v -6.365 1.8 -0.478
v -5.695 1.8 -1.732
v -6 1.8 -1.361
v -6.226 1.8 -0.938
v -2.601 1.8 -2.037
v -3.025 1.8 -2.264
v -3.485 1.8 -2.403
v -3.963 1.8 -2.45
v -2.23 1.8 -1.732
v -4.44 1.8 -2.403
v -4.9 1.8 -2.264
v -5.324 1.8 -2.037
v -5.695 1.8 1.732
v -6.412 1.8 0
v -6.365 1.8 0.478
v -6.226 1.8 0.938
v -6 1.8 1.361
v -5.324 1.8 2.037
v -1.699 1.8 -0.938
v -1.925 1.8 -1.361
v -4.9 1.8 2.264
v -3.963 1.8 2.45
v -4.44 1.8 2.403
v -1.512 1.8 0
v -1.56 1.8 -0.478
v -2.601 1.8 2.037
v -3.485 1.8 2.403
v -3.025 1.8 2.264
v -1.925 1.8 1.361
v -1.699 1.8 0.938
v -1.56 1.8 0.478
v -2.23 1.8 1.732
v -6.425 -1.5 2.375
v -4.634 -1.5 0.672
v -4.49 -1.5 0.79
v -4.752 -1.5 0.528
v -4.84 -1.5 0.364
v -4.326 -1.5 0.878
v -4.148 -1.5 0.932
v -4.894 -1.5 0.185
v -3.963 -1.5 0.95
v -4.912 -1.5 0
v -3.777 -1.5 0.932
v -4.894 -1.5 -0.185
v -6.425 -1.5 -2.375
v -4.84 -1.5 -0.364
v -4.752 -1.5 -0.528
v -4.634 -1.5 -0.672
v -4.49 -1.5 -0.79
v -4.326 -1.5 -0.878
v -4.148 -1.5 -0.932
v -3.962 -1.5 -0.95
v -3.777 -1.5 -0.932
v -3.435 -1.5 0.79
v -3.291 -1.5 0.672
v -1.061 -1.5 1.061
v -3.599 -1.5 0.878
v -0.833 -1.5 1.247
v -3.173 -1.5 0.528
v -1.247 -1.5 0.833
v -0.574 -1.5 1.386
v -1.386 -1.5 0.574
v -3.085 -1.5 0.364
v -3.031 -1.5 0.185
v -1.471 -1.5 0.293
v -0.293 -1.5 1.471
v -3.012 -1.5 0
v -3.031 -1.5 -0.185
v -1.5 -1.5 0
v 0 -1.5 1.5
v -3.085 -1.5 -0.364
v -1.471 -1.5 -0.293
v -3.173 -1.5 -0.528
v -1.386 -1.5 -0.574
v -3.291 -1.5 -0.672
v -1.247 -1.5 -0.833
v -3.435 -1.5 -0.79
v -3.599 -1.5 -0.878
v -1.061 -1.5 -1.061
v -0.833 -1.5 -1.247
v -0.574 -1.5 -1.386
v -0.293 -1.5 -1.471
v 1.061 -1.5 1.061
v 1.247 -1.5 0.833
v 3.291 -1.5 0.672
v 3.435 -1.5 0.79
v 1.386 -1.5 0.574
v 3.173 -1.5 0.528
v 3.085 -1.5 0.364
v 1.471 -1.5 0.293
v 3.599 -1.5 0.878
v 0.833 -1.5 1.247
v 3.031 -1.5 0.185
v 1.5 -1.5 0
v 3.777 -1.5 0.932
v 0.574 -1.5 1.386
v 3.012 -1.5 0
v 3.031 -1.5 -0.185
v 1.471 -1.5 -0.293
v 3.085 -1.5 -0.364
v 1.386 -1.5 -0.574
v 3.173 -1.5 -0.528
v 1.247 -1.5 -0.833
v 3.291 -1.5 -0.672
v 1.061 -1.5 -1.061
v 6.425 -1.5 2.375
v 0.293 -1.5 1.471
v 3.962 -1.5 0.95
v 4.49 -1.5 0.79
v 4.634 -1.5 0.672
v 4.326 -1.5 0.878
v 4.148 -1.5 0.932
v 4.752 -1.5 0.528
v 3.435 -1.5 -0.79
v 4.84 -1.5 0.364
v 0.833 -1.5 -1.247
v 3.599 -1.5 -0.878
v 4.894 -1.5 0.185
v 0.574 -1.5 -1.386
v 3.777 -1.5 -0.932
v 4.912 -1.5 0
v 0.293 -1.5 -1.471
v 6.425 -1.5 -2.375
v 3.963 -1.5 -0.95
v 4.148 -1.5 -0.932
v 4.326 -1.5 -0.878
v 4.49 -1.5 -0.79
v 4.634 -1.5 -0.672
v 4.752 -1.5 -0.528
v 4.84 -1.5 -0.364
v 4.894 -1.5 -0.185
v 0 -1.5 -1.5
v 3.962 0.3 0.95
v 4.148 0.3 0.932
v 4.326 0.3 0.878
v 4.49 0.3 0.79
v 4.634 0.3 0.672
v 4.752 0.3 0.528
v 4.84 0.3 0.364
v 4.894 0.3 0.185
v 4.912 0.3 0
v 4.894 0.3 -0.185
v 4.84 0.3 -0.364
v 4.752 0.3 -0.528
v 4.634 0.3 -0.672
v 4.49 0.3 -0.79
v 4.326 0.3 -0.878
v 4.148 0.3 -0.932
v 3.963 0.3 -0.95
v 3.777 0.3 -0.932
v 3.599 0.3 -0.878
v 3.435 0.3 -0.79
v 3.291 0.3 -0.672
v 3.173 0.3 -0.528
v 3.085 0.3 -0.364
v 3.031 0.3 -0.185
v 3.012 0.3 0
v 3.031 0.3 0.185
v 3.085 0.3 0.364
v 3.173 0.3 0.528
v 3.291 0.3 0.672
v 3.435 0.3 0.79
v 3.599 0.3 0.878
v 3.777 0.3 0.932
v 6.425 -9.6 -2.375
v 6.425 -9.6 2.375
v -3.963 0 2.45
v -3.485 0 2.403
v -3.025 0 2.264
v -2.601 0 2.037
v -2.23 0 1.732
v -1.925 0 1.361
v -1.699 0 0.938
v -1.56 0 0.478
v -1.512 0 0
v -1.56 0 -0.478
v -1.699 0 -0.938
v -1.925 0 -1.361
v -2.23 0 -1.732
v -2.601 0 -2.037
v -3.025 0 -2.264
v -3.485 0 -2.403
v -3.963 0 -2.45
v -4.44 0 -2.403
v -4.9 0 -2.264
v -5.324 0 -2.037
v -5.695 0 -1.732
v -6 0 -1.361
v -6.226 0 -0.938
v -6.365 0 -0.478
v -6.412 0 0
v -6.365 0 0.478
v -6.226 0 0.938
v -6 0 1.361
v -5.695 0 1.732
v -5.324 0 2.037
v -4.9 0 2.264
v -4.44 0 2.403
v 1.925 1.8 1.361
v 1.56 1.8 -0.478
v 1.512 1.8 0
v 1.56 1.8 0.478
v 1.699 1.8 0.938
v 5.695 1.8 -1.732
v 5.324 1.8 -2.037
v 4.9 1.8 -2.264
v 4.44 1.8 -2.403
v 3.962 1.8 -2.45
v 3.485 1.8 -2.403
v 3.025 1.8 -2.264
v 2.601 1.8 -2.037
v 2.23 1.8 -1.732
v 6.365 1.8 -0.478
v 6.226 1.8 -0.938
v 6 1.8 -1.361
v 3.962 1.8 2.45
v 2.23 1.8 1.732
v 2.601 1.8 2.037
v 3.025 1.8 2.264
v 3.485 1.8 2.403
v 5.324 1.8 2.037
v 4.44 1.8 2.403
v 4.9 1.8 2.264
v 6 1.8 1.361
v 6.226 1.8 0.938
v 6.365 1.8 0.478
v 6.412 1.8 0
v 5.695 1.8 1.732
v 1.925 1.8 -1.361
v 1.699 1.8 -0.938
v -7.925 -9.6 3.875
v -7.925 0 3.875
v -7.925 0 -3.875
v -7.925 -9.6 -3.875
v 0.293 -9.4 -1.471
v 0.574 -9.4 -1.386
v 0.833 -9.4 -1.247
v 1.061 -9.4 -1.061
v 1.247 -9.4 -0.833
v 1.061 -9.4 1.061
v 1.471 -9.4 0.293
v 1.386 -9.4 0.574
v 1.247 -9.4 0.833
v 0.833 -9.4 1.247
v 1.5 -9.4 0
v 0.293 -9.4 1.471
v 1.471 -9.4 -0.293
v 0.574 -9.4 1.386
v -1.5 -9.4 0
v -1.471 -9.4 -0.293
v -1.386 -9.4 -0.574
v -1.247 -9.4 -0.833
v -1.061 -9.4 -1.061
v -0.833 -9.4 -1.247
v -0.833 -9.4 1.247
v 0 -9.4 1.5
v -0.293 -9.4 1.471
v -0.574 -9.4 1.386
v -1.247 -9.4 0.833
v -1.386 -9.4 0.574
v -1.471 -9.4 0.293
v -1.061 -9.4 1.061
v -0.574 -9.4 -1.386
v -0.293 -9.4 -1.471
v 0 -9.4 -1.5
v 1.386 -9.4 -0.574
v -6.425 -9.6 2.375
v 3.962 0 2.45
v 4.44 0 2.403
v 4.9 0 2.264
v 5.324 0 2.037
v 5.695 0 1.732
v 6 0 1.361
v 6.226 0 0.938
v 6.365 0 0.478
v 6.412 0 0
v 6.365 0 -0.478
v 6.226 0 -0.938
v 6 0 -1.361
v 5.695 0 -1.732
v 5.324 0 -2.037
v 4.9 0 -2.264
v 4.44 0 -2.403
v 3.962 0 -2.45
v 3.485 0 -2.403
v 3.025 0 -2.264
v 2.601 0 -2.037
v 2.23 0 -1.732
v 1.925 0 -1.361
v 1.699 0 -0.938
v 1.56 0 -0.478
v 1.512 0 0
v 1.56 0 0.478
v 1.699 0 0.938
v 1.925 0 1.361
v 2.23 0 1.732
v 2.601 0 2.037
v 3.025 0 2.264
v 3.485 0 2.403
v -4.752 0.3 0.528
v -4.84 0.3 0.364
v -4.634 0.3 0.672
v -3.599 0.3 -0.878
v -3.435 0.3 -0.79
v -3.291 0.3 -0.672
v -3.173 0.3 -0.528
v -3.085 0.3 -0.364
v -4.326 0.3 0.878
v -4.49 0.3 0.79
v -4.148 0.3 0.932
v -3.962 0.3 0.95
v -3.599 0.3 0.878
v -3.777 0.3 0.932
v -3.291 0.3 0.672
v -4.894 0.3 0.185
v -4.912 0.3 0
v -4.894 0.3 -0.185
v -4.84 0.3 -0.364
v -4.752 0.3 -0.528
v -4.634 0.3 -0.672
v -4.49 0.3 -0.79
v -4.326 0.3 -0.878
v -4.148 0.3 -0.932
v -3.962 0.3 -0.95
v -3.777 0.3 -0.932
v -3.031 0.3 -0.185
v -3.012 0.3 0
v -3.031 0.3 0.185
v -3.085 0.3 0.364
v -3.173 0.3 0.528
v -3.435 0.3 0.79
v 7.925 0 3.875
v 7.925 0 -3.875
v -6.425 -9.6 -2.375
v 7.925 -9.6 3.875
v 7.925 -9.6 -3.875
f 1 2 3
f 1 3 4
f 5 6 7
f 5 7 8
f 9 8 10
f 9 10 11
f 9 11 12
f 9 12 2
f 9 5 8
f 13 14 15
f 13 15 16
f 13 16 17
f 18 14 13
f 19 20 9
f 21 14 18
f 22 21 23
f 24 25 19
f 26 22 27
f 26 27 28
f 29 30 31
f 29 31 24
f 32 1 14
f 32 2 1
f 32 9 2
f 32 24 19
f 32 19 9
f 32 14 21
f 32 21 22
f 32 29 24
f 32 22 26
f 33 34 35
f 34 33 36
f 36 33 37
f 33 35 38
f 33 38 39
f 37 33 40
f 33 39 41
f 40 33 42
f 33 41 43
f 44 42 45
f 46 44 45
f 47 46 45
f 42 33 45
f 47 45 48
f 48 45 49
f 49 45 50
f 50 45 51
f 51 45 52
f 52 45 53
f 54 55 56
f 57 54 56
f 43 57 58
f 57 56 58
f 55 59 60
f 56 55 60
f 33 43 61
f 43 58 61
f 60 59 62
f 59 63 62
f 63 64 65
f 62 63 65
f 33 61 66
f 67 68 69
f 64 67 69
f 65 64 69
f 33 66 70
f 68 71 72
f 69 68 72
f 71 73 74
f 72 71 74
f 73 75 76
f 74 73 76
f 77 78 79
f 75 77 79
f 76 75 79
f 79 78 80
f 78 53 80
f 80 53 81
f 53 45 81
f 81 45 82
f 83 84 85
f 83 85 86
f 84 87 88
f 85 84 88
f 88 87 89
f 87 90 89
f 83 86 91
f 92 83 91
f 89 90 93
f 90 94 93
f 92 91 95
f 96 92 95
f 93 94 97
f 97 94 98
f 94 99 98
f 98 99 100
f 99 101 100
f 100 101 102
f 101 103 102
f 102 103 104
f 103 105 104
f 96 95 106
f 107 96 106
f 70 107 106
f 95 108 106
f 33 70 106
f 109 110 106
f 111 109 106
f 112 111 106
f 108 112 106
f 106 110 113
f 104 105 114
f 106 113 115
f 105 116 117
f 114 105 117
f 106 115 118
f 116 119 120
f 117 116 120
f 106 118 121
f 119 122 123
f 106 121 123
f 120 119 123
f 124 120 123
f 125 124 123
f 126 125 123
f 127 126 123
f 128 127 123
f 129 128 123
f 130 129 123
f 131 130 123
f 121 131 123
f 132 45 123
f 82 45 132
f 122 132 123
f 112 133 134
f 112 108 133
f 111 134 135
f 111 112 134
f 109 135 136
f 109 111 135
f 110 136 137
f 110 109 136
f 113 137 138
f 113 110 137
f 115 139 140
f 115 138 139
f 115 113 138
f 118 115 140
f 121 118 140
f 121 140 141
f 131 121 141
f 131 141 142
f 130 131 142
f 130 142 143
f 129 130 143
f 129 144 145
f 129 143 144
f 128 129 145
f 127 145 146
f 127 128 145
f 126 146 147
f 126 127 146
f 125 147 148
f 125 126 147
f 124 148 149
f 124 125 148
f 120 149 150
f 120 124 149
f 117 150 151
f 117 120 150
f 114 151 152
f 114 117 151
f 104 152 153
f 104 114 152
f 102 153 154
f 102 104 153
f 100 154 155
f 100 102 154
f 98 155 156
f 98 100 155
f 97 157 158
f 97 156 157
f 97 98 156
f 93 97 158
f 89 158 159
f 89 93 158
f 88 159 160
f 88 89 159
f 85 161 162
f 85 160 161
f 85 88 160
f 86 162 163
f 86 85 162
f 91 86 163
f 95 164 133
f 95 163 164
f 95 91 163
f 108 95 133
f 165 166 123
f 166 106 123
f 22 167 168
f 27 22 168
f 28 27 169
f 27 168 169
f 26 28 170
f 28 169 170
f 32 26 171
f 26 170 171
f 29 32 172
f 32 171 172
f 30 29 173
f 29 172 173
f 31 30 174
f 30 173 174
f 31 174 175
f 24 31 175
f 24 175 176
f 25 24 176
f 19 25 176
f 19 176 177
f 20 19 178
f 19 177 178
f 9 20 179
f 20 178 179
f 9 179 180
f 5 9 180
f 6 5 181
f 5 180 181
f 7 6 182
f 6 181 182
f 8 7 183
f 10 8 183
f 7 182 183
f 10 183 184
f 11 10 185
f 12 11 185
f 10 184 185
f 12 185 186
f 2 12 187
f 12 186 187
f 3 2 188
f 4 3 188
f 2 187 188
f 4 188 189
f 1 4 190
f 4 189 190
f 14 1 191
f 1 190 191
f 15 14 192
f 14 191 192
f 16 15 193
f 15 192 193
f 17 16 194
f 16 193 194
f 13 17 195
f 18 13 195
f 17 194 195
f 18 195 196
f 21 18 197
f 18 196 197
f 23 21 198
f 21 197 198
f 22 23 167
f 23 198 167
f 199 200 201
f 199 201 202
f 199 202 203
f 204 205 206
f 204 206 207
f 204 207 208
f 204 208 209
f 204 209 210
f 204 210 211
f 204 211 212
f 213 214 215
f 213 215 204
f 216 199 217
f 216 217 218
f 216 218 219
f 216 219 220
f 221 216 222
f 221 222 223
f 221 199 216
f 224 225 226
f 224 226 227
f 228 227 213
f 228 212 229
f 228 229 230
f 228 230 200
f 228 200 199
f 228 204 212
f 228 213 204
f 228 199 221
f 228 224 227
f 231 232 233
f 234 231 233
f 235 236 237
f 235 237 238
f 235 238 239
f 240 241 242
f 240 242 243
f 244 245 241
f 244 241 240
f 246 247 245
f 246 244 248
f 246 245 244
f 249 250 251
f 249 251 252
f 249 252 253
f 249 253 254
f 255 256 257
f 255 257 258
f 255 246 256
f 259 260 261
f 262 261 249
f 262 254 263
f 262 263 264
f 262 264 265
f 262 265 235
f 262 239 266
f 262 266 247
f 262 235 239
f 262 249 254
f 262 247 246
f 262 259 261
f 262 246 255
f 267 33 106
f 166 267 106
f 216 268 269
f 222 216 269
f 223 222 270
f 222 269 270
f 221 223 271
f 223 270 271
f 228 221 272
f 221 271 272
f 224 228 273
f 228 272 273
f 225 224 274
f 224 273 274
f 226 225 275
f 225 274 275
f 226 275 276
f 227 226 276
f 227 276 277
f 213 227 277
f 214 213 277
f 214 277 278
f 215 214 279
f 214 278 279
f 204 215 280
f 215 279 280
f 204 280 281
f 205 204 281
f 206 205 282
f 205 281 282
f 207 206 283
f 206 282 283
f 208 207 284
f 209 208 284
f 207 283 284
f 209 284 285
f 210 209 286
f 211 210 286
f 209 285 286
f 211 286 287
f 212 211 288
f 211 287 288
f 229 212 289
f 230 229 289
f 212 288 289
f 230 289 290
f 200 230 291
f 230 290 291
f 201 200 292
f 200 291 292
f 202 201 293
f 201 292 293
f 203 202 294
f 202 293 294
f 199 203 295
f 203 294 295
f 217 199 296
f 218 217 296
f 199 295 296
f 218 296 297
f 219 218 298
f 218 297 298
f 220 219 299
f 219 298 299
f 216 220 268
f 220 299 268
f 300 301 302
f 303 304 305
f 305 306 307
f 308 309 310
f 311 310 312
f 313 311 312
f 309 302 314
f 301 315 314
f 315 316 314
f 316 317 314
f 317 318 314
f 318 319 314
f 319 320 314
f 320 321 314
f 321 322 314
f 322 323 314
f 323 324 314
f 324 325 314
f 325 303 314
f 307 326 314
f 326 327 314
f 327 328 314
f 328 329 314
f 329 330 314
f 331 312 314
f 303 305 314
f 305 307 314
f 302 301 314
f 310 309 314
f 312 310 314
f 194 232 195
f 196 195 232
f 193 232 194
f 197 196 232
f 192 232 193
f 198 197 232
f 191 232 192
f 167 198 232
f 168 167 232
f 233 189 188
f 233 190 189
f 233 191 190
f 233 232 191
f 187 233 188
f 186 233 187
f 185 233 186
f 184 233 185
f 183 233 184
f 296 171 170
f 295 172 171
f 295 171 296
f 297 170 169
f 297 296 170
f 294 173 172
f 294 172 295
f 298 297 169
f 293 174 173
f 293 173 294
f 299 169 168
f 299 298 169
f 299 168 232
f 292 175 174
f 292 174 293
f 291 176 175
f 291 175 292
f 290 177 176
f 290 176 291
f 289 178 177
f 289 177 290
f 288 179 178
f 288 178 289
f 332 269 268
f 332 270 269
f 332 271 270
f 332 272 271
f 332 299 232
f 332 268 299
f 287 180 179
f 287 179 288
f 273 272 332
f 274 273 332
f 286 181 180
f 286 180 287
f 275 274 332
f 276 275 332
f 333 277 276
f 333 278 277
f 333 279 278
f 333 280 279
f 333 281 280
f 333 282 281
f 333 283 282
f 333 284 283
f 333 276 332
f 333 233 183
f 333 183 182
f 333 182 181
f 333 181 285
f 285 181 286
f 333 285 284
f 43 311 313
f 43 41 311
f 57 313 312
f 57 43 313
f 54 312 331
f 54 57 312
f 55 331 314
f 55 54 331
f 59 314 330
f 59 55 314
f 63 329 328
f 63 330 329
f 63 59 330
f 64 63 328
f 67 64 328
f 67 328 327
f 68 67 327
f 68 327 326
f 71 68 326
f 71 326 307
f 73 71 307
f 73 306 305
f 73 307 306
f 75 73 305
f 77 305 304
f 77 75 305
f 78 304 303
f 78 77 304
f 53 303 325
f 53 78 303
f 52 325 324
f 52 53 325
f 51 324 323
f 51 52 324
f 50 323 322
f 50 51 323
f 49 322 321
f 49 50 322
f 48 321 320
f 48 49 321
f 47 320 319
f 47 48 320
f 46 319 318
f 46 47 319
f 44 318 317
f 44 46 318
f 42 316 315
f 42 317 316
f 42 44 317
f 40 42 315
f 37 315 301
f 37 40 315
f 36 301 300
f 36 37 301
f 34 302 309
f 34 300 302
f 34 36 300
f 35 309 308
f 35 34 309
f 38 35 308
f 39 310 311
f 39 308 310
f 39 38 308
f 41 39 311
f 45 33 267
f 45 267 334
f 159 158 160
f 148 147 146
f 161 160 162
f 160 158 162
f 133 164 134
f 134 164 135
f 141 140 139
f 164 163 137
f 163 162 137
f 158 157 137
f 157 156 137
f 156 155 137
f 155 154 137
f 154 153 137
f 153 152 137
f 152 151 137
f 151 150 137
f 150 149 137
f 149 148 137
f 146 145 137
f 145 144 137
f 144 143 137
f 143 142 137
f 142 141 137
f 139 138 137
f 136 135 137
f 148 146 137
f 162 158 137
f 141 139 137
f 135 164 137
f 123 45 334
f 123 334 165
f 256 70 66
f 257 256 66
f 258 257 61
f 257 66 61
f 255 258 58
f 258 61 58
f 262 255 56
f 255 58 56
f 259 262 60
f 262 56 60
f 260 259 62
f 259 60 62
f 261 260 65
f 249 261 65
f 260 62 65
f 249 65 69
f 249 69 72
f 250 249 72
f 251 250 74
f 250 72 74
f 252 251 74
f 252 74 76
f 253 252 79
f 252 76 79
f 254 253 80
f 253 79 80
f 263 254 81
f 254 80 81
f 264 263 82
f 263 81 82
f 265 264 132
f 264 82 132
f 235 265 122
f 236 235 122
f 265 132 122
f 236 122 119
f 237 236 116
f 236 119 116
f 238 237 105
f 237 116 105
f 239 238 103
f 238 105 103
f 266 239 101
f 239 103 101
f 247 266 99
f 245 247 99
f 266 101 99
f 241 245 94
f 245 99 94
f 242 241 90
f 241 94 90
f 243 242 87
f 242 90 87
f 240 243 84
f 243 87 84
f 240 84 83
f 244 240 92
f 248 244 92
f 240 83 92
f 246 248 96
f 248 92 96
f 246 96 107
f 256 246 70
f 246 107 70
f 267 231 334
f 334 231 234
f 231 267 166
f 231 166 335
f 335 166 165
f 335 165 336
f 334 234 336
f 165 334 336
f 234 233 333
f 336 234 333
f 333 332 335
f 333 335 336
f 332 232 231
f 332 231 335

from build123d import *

# Parameters (mm, degrees)
SKETCH1_W           = 15.85
SKETCH1_H           = 7.75
BOSS_EXTRUDE1_DEPTH = 9.6
SKETCH2_R           = 2.45
BOSS_EXTRUDE2_DEPTH = 1.8
SHELL1_T            = -1.5
SKETCH3_R           = 1.5
BOSS_EXTRUDE3_DEPTH = 7.9


with BuildPart() as part:
    # Sketch1 → Boss-Extrude1 (new body)
    with BuildSketch(Plane(origin=(0, 0, 0), x_dir=(1, 0, 0), z_dir=(0, 1, 0))):
        Rectangle(SKETCH1_W, SKETCH1_H)
    extrude(amount=-BOSS_EXTRUDE1_DEPTH)

    # Sketch2 → Boss-Extrude2 (add)
    with BuildSketch(Plane(origin=(0, 0, 0), x_dir=(1, 0, 0), z_dir=(0, 1, 0))):
        with Locations(Location((-3.9625, 0, 0), (0, 0, 270))):
            Circle(SKETCH2_R)
        with Locations(Location((3.9625, 0, 0), (0, 0, 270))):
            Circle(SKETCH2_R)
    extrude(amount=BOSS_EXTRUDE2_DEPTH)

    # Shell1
    shell1_openings = [part.faces().sort_by_distance(p)[0] for p in [
        (0, -9.6, 0),
    ]]
    offset(amount=SHELL1_T, openings=shell1_openings, kind=Kind.INTERSECTION)

    # Sketch3 → Boss-Extrude3 (add)
    with BuildSketch(Plane.XZ.offset(1.5)):
        with Locations(Location((0, 0, 0), (0, 0, 90))):
            Circle(SKETCH3_R)
    extrude(amount=BOSS_EXTRUDE3_DEPTH)


solid = part.part
